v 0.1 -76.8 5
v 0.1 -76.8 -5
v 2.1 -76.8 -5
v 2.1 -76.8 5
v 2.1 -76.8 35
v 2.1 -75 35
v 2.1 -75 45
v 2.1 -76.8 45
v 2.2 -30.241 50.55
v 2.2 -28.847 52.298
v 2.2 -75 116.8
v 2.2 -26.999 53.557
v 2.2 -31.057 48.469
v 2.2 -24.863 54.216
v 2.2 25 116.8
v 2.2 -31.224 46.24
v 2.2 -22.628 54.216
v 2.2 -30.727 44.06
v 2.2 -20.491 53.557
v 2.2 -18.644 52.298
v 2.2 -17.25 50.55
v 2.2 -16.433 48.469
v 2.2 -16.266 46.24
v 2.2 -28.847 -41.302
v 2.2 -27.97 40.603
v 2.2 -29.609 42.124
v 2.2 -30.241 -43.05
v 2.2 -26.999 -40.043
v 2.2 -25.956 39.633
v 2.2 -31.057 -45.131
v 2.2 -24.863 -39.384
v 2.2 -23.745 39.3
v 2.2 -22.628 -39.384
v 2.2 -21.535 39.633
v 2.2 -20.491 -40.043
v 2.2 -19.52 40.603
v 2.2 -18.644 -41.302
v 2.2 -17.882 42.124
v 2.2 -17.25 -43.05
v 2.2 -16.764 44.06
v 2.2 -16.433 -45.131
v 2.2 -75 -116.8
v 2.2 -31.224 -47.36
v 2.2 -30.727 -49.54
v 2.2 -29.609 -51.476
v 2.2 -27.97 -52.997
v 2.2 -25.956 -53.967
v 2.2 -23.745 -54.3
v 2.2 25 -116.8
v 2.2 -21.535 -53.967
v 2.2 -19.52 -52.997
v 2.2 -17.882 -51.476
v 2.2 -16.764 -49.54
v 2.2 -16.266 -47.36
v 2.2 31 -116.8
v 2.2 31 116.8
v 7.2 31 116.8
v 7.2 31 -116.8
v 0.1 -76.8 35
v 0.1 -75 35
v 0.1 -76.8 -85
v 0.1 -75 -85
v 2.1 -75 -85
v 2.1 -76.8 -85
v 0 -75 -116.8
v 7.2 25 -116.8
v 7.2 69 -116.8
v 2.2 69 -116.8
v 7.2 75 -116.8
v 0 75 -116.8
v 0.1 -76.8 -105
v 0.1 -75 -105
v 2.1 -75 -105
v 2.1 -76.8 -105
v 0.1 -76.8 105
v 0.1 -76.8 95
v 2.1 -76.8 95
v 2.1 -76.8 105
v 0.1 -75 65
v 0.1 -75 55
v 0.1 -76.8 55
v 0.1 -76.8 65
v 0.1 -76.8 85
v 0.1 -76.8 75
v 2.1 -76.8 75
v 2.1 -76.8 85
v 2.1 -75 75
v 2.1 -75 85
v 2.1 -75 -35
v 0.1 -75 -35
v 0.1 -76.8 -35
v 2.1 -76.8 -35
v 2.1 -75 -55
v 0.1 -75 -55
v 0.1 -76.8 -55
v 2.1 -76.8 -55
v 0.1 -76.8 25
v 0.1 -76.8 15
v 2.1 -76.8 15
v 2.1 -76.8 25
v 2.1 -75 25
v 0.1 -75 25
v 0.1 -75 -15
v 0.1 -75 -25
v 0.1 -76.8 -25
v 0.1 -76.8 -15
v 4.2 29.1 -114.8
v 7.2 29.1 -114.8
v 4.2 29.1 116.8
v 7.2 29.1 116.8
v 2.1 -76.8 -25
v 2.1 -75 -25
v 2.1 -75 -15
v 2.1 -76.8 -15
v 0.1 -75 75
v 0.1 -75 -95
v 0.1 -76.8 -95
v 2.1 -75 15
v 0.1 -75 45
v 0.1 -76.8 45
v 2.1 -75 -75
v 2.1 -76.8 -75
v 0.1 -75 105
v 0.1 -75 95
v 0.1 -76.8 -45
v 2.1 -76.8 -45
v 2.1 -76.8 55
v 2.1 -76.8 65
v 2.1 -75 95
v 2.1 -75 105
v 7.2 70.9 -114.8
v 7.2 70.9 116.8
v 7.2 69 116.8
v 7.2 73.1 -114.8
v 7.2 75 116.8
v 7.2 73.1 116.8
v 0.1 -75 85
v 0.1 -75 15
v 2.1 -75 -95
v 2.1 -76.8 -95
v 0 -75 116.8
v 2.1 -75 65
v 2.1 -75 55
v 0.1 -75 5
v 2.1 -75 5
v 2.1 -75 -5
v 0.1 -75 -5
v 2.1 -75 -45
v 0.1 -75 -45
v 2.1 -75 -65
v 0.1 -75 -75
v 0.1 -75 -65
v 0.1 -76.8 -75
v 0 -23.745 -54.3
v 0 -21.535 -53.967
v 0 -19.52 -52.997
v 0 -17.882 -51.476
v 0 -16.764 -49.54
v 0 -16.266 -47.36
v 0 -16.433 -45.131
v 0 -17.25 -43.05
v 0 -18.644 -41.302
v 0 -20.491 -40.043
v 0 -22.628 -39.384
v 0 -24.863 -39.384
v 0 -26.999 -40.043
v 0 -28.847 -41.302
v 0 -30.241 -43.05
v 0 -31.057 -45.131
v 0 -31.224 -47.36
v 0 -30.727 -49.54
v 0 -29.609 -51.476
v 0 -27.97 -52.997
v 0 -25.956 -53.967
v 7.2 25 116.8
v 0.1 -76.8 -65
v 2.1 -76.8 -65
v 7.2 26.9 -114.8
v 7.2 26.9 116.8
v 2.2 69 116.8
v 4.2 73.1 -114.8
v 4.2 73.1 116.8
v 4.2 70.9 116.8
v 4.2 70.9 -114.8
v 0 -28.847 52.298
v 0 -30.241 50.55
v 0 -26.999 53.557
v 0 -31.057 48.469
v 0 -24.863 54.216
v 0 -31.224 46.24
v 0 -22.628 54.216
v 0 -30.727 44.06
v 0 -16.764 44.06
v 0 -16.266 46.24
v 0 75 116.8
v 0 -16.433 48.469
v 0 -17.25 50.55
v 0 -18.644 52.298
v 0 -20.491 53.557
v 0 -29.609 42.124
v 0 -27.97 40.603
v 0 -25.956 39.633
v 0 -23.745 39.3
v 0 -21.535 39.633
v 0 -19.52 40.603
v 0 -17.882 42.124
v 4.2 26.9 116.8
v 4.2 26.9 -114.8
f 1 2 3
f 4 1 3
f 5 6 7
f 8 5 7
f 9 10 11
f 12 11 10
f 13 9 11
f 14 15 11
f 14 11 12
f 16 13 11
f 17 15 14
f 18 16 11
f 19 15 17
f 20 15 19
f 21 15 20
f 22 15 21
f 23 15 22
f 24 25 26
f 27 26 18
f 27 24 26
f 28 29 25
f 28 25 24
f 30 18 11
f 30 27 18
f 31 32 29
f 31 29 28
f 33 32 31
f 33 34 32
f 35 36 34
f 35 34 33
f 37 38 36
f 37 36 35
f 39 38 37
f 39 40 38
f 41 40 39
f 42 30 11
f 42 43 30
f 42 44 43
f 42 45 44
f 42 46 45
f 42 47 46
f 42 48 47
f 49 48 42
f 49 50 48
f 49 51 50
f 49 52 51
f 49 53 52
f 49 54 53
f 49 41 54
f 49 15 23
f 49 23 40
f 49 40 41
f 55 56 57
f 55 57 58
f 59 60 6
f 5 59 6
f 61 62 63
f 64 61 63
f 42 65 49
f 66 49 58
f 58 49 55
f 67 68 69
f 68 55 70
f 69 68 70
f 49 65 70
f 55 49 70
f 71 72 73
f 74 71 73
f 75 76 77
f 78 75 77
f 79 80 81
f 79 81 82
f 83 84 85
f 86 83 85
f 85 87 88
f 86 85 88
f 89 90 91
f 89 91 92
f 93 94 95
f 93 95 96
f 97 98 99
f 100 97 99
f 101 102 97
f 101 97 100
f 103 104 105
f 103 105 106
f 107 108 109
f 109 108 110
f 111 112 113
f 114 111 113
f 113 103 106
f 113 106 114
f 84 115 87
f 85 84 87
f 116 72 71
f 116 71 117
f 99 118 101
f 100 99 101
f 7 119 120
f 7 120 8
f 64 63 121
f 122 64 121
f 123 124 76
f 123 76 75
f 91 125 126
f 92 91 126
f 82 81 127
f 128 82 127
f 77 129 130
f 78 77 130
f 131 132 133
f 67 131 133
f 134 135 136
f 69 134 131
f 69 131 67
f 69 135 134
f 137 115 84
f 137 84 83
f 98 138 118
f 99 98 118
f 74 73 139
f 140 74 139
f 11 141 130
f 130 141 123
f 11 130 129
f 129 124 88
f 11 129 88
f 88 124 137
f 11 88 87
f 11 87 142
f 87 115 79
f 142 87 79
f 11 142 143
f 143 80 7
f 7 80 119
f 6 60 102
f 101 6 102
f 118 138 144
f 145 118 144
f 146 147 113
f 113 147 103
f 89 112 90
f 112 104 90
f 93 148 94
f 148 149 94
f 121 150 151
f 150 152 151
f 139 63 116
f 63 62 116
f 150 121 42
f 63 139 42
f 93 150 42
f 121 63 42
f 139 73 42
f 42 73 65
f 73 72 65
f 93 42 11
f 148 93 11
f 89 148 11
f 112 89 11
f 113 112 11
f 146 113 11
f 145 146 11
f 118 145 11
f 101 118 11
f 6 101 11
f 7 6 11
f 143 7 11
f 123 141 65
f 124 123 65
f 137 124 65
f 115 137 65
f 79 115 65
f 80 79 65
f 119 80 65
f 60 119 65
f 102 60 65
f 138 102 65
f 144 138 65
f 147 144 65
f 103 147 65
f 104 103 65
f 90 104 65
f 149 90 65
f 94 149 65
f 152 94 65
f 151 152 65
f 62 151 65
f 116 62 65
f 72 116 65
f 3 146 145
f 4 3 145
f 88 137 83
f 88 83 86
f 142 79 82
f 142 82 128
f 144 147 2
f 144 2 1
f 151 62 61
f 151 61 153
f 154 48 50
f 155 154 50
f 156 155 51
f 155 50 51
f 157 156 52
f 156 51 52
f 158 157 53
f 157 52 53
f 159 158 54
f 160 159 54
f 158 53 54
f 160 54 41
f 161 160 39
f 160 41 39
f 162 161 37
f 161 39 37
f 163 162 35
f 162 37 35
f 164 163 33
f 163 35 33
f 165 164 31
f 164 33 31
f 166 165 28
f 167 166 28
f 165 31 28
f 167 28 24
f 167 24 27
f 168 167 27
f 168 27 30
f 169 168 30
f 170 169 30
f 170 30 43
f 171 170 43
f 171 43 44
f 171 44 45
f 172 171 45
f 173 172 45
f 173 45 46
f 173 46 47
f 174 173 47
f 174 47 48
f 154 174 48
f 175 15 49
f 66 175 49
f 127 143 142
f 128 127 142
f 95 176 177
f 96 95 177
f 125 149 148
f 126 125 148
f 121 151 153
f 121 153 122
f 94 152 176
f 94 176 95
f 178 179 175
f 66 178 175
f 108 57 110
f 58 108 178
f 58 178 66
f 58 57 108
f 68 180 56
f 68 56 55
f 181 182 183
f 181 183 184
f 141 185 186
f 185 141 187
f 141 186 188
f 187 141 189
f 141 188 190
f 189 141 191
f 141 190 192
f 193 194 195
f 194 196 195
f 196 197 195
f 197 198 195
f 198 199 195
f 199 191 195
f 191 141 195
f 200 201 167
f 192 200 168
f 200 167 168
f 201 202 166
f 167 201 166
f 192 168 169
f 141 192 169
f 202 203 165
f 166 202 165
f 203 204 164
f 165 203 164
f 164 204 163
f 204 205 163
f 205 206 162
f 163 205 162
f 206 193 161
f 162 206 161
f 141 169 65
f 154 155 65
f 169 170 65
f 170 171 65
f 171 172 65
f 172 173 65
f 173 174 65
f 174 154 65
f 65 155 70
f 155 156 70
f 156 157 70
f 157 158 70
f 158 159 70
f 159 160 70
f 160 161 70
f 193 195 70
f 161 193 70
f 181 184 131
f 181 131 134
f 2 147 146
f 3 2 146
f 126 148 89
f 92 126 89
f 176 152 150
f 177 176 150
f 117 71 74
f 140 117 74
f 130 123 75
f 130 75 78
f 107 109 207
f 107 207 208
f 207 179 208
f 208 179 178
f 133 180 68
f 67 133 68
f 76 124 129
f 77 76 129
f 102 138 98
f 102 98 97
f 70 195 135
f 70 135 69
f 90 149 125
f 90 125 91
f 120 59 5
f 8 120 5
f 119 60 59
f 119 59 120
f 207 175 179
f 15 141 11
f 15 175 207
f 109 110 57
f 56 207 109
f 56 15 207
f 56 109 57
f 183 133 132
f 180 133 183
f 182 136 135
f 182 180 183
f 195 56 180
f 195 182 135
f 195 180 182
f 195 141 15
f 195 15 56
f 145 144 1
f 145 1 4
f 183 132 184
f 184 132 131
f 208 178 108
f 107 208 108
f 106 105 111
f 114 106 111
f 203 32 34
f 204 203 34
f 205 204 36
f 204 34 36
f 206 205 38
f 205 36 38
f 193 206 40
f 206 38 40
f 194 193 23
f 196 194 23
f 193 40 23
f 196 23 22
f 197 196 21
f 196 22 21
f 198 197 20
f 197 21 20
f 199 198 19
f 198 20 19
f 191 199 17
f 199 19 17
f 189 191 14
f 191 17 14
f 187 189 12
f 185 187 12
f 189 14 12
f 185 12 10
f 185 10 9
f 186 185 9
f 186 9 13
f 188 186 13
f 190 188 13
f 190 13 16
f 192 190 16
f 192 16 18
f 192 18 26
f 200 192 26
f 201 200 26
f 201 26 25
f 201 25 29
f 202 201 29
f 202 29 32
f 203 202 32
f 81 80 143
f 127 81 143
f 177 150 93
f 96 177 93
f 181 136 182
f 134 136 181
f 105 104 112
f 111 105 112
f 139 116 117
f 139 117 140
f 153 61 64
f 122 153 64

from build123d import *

# Parameters (mm, degrees)
SKETCH_4_W          = 233.6
SKETCH_4_H          = 150
EXTRUDE_2_DEPTH     = 2.2
SKETCH_6_W          = 2
SKETCH_6_H          = 10
EXTRUDE_3_DEPTH     = 1.8
SKETCH_7_W          = 233.6
SKETCH_7_H          = 6
EXTRUDE_4_DEPTH     = 5
SKETCH_8_W          = 114.8
SKETCH_8_H          = 2.2
SKETCH_8_W_2        = 116.8
SKETCH_8_W_3        = 231.6
CUT_EXTRUDE_1_DEPTH = 3
SKETCH1_R           = 7.5
CUT_EXTRUDE1_DEPTH  = 10


with BuildPart() as part:
    # 草图4 → 凸台-拉伸2 (new body)
    with BuildSketch(Plane(origin=(0, 0, 0), x_dir=(0, 0, -1), z_dir=(1, 0, 0))):
        Rectangle(SKETCH_4_W, SKETCH_4_H)
    extrude(amount=EXTRUDE_2_DEPTH)

    # 草图6 → 凸台-拉伸3 (add)
    with BuildSketch(Plane.XZ.offset(75)):
        with Locations((1.1, 20)):
            Rectangle(SKETCH_6_W, SKETCH_6_H)
        with Locations((1.1, 0)):
            Rectangle(SKETCH_6_W, SKETCH_6_H)
        with Locations((1.1, 40)):
            Rectangle(SKETCH_6_W, SKETCH_6_H)
        with Locations((1.1, 60)):
            Rectangle(SKETCH_6_W, SKETCH_6_H)
        with Locations((1.1, 80)):
            Rectangle(SKETCH_6_W, SKETCH_6_H)
        with Locations((1.1, 100)):
            Rectangle(SKETCH_6_W, SKETCH_6_H)
        with Locations((1.1, -20)):
            Rectangle(SKETCH_6_W, SKETCH_6_H)
        with Locations((1.1, -40)):
            Rectangle(SKETCH_6_W, SKETCH_6_H)
        with Locations((1.1, -60)):
            Rectangle(SKETCH_6_W, SKETCH_6_H)
        with Locations((1.1, -80)):
            Rectangle(SKETCH_6_W, SKETCH_6_H)
        with Locations((1.1, -100)):
            Rectangle(SKETCH_6_W, SKETCH_6_H)
    extrude(amount=EXTRUDE_3_DEPTH)

    # 草图7 → 凸台-拉伸4 (add)
    with BuildSketch(Plane(origin=(2.2, 0, 0), x_dir=(0, 0, -1), z_dir=(1, 0, 0))):
        with Locations((0, 28)):
            Rectangle(SKETCH_7_W, SKETCH_7_H)
        with Locations((0, 72)):
            Rectangle(SKETCH_7_W, SKETCH_7_H)
    extrude(amount=EXTRUDE_4_DEPTH)

    # 草图8 → 切除-拉伸1 (cut)
    with BuildSketch(Plane(origin=(7.2, 0, 0), x_dir=(0, 0, -1), z_dir=(1, 0, 0))):
        with Locations((57.4, 28)):
            Rectangle(SKETCH_8_W, SKETCH_8_H)
        with Locations((-58.4, 28)):
            Rectangle(SKETCH_8_W_2, SKETCH_8_H)
        with Locations((-1, 72)):
            Rectangle(SKETCH_8_W_3, SKETCH_8_H)
    extrude(amount=-CUT_EXTRUDE_1_DEPTH, mode=Mode.SUBTRACT)

    # Sketch1 → Cut-Extrude1 (cut)
    with BuildSketch(Plane(origin=(2.2, 0, 0), x_dir=(0, 0, -1), z_dir=(1, 0, 0))):
        with Locations((-46.8, -23.745319948)):
            Circle(SKETCH1_R)
        with Locations((46.8, -23.745319948)):
            Circle(SKETCH1_R)
    extrude(amount=-CUT_EXTRUDE1_DEPTH, mode=Mode.SUBTRACT)


solid = part.part
